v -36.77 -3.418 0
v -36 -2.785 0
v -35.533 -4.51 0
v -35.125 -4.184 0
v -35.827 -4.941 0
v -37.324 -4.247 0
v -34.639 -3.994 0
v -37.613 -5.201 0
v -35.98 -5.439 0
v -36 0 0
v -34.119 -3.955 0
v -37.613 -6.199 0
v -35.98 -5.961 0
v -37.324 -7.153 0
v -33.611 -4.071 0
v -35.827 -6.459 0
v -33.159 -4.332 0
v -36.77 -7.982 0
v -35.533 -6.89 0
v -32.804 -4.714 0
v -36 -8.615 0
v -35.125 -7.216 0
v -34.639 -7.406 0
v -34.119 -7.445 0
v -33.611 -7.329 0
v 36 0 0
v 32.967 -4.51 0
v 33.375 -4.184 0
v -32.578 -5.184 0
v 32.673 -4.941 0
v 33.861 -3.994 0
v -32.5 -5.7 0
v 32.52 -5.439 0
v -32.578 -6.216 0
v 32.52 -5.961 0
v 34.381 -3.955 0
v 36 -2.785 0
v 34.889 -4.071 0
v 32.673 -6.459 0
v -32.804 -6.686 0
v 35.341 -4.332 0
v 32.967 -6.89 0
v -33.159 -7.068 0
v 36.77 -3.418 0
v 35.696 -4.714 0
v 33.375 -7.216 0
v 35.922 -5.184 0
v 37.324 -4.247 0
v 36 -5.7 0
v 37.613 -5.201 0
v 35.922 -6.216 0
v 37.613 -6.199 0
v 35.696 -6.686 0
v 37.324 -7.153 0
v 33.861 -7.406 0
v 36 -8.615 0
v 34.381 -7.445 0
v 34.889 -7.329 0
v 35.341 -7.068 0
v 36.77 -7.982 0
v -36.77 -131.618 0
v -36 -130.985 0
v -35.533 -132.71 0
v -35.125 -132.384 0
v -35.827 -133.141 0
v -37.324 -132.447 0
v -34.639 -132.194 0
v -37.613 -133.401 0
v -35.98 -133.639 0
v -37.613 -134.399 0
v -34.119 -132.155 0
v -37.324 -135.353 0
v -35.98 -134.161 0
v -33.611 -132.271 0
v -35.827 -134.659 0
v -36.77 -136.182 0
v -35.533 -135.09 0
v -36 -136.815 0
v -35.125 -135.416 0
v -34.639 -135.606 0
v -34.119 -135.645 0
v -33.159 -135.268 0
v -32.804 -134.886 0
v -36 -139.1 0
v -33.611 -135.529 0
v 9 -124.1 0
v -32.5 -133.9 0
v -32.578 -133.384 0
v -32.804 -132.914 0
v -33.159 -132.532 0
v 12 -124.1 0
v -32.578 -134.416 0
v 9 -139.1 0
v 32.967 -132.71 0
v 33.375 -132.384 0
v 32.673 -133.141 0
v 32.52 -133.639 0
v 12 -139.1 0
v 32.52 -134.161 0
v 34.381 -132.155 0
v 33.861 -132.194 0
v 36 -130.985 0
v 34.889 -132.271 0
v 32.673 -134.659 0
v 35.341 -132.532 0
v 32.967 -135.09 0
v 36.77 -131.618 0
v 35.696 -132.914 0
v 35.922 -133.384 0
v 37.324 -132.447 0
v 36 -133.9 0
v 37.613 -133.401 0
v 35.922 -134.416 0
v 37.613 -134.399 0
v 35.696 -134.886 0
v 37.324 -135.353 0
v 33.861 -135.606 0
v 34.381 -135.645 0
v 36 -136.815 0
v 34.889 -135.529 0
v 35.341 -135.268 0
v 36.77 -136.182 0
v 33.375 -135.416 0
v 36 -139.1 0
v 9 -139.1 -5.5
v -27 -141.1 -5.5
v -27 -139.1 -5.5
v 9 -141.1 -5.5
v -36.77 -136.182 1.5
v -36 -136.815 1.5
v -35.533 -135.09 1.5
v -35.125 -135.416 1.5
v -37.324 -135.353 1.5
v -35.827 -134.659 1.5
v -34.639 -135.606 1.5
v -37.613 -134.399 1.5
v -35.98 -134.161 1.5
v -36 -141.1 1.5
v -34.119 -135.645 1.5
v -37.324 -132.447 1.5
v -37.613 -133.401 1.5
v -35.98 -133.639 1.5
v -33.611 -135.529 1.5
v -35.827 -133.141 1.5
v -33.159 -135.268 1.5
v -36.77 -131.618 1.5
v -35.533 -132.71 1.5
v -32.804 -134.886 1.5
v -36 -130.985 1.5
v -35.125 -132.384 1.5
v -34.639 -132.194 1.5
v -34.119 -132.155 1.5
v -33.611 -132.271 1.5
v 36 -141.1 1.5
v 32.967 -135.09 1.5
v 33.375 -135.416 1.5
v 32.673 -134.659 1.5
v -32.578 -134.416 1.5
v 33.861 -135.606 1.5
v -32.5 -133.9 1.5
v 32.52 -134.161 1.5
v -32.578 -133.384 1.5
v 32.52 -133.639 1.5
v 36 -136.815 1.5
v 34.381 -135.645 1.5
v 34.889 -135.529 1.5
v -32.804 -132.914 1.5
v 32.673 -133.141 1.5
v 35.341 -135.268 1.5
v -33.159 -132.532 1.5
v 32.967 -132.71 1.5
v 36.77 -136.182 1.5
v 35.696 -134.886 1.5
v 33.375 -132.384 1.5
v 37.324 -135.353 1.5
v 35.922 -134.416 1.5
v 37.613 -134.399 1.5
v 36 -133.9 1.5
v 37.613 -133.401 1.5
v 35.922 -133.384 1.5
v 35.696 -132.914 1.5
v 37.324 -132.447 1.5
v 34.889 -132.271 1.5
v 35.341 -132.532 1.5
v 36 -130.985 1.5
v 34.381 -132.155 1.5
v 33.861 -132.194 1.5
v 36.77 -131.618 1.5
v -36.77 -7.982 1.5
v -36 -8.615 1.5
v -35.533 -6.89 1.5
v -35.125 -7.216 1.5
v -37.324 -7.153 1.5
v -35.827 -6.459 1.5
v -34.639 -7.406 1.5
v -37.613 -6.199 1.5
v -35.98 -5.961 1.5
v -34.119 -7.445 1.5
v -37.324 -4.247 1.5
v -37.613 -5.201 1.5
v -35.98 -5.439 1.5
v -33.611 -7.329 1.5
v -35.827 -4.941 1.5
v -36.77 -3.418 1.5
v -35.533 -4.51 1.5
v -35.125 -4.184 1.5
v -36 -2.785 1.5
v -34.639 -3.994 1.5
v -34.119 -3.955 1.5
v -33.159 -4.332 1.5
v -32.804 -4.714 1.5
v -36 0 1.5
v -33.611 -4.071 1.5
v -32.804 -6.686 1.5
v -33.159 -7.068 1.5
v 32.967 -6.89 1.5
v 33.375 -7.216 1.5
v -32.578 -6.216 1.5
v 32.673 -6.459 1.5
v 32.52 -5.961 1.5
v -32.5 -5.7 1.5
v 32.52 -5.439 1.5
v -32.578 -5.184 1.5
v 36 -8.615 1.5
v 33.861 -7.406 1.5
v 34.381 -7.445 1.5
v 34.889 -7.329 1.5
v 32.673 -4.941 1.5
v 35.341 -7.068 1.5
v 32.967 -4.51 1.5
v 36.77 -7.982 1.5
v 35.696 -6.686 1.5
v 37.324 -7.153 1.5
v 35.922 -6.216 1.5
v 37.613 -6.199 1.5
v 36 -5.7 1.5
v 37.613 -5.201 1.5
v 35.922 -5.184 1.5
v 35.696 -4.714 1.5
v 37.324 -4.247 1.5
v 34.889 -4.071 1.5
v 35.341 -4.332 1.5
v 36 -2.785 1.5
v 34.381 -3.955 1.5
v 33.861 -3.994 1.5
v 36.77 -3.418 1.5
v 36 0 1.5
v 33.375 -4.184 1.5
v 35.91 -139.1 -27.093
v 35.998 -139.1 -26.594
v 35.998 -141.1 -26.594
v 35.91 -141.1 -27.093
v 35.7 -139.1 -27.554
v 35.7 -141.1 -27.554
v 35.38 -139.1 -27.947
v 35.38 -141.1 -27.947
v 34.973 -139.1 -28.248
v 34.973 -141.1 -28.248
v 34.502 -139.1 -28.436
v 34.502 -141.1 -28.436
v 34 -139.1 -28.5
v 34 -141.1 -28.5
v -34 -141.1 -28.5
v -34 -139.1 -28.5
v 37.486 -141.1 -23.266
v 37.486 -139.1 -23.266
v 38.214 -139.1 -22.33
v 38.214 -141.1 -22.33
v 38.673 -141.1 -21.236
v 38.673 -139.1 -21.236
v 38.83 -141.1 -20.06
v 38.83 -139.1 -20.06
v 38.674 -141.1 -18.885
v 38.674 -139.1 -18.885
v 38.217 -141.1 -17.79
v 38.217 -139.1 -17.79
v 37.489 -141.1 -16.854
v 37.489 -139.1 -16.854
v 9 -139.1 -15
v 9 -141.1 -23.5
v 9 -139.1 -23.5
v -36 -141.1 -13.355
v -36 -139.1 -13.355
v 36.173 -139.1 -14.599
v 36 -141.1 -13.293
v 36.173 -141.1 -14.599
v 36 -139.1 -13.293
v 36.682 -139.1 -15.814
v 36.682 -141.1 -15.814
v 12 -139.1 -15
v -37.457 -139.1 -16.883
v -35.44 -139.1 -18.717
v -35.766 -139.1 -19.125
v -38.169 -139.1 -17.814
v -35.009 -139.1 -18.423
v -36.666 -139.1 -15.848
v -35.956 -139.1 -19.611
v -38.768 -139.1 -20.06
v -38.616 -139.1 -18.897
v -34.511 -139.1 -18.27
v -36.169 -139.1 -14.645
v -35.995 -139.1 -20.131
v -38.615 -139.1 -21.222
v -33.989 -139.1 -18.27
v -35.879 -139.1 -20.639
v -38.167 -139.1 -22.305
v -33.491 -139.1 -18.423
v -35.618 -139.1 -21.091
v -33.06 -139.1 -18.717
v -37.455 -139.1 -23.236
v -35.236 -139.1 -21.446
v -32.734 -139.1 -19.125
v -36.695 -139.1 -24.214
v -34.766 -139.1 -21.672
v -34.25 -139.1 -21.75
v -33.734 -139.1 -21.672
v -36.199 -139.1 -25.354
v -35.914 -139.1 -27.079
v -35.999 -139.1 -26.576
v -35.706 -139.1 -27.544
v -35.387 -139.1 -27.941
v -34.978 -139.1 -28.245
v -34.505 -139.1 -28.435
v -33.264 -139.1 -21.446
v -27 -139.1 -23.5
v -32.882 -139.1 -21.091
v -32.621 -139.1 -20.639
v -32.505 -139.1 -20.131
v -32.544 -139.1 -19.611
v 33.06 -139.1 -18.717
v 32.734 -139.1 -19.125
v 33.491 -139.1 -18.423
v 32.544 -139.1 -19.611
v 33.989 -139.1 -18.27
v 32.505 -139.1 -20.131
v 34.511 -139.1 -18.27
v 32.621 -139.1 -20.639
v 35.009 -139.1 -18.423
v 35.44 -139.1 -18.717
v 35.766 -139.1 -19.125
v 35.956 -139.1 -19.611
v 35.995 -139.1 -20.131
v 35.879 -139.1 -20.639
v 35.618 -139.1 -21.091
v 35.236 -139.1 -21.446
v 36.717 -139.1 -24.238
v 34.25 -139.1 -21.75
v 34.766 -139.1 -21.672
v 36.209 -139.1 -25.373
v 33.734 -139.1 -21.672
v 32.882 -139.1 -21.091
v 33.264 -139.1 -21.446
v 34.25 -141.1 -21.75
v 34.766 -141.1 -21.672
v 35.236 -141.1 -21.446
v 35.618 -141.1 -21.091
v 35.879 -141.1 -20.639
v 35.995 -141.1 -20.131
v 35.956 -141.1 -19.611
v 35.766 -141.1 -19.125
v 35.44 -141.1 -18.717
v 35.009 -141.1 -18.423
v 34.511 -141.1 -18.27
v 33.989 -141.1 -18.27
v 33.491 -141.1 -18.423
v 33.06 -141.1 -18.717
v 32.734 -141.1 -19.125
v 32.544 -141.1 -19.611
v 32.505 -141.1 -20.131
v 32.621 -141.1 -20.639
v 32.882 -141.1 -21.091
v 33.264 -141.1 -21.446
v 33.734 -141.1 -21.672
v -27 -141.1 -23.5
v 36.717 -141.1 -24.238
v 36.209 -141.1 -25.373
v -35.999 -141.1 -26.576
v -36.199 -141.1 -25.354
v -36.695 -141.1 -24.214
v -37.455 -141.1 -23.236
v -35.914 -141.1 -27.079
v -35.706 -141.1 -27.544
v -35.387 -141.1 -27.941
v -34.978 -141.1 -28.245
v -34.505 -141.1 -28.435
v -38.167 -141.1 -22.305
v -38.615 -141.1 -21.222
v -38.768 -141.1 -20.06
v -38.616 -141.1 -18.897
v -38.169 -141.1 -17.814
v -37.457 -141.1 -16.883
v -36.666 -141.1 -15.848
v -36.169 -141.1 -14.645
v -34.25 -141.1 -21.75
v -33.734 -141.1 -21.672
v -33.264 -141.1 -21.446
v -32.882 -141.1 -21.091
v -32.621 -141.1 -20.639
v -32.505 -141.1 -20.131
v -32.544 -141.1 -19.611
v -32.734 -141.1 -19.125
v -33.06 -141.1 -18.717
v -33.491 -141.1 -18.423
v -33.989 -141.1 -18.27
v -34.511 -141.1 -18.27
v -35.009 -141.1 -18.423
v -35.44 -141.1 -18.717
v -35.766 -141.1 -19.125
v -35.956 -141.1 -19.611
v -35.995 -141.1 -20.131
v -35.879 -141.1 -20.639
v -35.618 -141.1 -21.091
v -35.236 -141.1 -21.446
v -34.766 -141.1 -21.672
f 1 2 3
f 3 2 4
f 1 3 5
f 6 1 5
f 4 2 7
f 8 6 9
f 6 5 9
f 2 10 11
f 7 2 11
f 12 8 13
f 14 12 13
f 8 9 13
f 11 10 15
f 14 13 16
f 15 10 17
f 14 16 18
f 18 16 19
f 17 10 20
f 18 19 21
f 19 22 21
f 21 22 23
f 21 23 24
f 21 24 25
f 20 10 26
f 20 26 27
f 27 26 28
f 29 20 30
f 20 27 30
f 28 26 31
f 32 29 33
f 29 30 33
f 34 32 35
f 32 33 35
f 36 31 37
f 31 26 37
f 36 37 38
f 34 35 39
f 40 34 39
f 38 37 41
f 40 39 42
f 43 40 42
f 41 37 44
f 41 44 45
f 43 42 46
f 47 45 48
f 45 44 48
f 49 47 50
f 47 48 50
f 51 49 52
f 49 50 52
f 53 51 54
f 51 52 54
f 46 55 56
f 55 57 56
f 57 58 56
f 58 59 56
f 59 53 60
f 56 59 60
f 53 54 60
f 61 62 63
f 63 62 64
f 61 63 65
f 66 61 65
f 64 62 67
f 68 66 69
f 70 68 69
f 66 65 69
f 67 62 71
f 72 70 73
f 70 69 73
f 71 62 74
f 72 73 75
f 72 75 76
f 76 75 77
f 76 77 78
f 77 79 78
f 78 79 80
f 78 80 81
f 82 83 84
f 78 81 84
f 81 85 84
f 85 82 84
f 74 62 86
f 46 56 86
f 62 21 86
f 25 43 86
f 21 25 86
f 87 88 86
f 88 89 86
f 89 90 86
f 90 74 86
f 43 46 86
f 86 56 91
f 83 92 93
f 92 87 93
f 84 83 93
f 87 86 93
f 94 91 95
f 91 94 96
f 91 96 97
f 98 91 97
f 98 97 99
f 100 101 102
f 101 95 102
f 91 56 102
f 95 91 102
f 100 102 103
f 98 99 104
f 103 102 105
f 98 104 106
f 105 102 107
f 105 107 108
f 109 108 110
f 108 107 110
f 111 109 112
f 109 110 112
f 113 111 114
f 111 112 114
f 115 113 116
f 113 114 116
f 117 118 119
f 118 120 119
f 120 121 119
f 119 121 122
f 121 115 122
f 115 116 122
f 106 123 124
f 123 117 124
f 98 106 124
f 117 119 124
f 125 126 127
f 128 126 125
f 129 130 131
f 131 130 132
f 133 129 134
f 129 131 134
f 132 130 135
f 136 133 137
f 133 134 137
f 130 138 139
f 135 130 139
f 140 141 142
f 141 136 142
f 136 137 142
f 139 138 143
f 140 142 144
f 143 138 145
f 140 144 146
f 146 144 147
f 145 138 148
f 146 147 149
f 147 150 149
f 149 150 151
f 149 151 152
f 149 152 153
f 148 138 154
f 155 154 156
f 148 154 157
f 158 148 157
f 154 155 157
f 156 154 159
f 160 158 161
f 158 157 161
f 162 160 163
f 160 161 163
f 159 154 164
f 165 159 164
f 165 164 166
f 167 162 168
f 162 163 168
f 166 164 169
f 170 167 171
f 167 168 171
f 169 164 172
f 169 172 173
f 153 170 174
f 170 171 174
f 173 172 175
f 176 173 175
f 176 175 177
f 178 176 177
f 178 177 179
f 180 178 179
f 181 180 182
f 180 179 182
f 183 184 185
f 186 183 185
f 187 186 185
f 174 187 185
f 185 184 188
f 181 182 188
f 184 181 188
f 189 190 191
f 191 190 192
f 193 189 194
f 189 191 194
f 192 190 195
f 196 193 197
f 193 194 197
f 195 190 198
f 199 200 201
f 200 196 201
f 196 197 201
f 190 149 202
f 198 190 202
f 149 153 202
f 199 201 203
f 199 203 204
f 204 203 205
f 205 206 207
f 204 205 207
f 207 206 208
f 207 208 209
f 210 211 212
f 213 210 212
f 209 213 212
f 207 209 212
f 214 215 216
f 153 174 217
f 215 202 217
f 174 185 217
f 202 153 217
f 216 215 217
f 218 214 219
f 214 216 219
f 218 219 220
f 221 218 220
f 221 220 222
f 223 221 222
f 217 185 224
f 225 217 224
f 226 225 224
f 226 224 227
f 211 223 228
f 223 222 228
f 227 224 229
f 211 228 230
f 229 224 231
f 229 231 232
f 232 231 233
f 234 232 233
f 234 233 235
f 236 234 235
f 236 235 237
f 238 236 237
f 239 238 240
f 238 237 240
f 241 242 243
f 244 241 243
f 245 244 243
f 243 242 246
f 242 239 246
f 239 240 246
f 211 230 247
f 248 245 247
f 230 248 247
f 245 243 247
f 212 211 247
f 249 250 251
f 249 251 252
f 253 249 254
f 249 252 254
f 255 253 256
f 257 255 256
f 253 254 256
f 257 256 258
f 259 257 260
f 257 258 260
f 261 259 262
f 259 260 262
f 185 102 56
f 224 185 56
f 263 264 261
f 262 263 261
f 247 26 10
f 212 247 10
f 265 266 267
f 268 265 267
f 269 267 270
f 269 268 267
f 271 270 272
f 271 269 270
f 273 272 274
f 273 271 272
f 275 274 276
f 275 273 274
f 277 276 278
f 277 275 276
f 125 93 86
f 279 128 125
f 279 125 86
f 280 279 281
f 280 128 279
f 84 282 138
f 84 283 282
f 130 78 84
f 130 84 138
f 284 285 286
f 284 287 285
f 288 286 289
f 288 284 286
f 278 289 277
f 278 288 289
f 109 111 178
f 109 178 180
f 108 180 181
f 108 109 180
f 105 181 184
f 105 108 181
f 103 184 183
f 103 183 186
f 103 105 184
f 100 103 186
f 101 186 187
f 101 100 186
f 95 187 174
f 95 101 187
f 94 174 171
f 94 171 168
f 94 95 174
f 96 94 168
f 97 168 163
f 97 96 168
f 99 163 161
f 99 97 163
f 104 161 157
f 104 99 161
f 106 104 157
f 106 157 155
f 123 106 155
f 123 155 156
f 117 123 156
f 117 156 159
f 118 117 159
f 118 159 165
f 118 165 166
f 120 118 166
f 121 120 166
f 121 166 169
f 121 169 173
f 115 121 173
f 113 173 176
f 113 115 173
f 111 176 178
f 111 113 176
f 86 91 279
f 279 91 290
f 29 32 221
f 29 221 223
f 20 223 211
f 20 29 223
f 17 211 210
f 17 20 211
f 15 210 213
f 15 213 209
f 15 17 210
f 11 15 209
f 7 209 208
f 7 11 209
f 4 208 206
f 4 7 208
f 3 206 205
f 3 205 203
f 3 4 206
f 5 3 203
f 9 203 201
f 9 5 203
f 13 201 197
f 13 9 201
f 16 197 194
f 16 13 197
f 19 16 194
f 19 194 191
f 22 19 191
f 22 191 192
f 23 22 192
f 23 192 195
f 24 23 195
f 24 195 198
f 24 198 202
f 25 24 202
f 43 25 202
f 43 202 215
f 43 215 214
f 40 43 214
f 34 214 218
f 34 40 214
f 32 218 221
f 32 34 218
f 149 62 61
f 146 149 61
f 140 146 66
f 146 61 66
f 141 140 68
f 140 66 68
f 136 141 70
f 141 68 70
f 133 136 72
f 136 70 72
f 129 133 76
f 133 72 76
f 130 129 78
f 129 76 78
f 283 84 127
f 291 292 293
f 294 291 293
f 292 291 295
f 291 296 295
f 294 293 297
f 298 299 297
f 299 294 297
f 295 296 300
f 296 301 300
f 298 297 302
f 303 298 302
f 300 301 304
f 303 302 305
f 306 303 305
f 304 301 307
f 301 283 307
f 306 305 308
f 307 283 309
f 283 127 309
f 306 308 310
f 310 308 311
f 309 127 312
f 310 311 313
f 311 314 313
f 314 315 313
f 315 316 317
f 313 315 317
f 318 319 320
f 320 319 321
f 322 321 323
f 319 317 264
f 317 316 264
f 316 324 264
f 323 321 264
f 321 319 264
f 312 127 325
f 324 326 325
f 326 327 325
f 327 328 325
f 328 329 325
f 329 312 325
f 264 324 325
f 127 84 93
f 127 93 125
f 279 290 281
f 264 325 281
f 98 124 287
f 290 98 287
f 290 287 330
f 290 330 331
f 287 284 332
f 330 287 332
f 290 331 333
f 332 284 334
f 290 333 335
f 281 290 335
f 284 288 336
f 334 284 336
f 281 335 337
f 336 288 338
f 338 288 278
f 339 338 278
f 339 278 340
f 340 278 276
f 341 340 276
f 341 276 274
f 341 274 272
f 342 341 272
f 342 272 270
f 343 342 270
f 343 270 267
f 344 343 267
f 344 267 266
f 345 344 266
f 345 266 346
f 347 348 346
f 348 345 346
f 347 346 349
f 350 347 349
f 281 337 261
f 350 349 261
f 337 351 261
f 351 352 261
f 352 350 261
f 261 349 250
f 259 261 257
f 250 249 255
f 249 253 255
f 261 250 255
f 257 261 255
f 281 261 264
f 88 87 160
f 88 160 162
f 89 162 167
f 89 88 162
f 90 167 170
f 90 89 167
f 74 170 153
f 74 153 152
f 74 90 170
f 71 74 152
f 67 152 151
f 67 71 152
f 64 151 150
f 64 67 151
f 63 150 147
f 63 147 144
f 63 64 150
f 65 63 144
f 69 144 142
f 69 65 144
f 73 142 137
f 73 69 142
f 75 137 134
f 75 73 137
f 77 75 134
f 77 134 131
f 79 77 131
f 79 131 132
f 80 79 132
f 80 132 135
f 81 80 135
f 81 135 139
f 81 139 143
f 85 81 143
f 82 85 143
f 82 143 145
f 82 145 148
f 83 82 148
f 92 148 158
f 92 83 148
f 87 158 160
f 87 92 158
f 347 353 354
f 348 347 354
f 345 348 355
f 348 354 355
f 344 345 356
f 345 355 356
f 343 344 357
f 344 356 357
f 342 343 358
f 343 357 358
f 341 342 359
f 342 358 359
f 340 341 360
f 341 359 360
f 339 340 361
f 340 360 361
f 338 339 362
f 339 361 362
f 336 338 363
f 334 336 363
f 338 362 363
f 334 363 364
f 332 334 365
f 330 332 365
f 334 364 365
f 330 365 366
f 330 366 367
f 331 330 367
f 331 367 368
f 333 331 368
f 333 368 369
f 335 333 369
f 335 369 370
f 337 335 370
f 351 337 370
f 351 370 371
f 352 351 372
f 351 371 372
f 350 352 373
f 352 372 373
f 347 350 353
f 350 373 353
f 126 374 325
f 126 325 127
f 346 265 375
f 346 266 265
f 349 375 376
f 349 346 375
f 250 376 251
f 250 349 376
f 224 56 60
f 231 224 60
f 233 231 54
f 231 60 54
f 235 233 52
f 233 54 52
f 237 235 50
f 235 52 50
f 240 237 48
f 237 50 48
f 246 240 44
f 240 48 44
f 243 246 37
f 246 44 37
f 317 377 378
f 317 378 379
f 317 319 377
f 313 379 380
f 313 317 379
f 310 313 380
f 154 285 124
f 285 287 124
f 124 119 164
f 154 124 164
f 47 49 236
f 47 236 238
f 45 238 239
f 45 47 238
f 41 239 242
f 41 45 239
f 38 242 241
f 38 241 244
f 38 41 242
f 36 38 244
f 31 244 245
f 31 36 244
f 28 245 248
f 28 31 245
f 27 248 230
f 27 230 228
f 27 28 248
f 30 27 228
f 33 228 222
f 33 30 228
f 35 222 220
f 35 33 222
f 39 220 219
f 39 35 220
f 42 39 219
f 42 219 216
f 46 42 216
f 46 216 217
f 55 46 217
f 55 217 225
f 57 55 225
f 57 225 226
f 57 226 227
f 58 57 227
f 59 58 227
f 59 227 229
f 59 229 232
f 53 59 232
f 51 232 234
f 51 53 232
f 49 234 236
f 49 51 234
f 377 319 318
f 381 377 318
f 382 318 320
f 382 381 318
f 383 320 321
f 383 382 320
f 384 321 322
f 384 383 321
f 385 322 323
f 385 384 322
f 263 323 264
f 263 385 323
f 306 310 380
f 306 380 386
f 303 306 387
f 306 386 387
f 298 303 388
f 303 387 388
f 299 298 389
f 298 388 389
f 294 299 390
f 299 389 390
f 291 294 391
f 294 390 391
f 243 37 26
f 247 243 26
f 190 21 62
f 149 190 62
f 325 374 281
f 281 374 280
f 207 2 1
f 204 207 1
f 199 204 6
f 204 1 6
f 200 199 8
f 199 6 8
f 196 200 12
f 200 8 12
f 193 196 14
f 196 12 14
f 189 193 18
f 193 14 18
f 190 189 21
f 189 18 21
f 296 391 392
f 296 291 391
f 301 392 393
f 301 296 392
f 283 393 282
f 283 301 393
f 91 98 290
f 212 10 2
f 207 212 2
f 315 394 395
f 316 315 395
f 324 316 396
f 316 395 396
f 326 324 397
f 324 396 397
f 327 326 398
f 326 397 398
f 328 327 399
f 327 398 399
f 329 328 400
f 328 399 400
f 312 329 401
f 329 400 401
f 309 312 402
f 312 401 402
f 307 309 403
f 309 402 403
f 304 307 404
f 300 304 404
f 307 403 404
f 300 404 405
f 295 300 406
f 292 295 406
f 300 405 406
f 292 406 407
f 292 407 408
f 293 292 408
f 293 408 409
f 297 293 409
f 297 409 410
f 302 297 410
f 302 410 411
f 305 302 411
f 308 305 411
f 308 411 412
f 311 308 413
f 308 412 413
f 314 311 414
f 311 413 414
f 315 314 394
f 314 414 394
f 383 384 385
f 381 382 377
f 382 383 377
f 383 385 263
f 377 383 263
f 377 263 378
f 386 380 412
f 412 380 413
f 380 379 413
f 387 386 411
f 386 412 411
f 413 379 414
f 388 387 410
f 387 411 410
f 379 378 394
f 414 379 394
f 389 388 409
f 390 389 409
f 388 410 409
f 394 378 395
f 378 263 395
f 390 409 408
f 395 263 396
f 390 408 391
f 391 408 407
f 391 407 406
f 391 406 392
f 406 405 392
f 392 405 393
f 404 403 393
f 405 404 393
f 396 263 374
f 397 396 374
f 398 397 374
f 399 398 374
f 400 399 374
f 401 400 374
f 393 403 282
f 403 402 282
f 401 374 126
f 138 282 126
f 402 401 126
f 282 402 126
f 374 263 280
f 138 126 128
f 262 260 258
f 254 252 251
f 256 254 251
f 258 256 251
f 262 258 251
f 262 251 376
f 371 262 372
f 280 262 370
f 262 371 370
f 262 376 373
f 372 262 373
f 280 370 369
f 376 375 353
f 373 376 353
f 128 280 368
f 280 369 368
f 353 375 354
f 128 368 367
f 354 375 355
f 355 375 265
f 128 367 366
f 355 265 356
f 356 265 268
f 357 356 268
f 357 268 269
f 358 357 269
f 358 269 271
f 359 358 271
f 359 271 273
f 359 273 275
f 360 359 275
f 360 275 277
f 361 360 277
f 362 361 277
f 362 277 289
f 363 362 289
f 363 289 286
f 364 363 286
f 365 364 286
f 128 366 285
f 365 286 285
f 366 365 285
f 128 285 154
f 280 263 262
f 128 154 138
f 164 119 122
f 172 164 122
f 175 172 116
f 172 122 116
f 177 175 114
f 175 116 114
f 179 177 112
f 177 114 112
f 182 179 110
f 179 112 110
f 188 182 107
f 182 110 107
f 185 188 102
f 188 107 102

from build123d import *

# Parameters (mm, degrees)
SKETCH1_R               = 1.75
BOSS_EXTRUDE1_DEPTH     = 1.5
BOSS_EXTRUDE2_START     = -72
BOSS_EXTRUDE2_DEPTH     = 72
BOSS_EXTRUDE4_DEPTH     = 2
SKETCH5_R               = 1.75
CUT_EXTRUDE1_DEPTH      = 2
CUT_EXTRUDE2_DEPTH      = 152.713437324
CUT_EXTRUDE2_DEPTH_BACK = 152.713437324
SKETCH6_W               = 72
SKETCH6_H               = 11.5
FILLET1_R               = 2
SKETCH8_W               = 36
SKETCH8_H               = 18
CUT_EXTRUDE3_DEPTH      = 22.4262221
SKETCH11_W              = 3
SKETCH11_H              = 15
BOSS_EXTRUDE7_DEPTH     = 15
CUT_EXTRUDE5_REACH      = 154.64
FILLET3_R               = 5


with BuildPart() as part:
    # Sketch1 → Boss-Extrude1 (new body)
    with BuildSketch(Plane.XY):
        with BuildLine():
            Line((-32.5, -138.9), (32.5, -138.9))
            Line((32.5, -138.9), (36, -138.9))
            Line((36, -138.9), (36, -136.815047169))
            ThreePointArc((36, -136.815047169), (37.65, -133.9), (36, -130.984952831))
            Line((36, -130.984952831), (36, -8.615047169))
            ThreePointArc((36, -8.615047169), (37.65, -5.7), (36, -2.784952831))
            Line((36, -2.784952831), (36, 0))
            Line((36, 0), (-36, 0))
            Line((-36, 0), (-36, -2.784952831))
            ThreePointArc((-36, -2.784952831), (-37.65, -5.7), (-36, -8.615047169))
            Line((-36, -8.615047169), (-36, -130.984952831))
            ThreePointArc((-36, -130.984952831), (-37.65, -133.9), (-36, -136.815047169))
            Line((-36, -136.815047169), (-36, -138.9))
            Line((-36, -138.9), (-32.5, -138.9))
        make_face()
        with Locations((-34.25, -133.9)):
            Circle(SKETCH1_R, mode=Mode.SUBTRACT)
        with Locations((34.25, -133.9)):
            Circle(SKETCH1_R, mode=Mode.SUBTRACT)
        with Locations((34.25, -5.7)):
            Circle(SKETCH1_R, mode=Mode.SUBTRACT)
        with Locations((-34.25, -5.7)):
            Circle(SKETCH1_R, mode=Mode.SUBTRACT)
    extrude(amount=BOSS_EXTRUDE1_DEPTH)

    # Sketch2 → Boss-Extrude2 (add)
    with BuildSketch(Plane.ZY.offset(36).offset(BOSS_EXTRUDE2_START)):
        Polygon((1.5, -141.1), (1.5, -138.9), (0, -138.9), (0, -139.1), (-40, -139.1), (-40, -141.1), align=None)
    extrude(amount=BOSS_EXTRUDE2_DEPTH)

    # Sketch4 → Boss-Extrude4 (add)
    with BuildSketch(Plane.XZ.offset(141.1)):
        with BuildLine():
            Line((-36, -15.904411924), (-36, -24.211404996))
            ThreePointArc((-36, -24.211404996), (-38.768391924, -20.05790846), (-36, -15.904411924))
        make_face()
        with BuildLine():
            Line((36, -15.879321263), (36, -24.236495657))
            ThreePointArc((36, -24.236495657), (38.8298476, -20.05790846), (36, -15.879321263))
        make_face()
    extrude(amount=-BOSS_EXTRUDE4_DEPTH)

    # Sketch5 → Cut-Extrude1 (cut)
    with BuildSketch(Plane.XZ.offset(141.1)):
        with Locations(Location((-34.25, -20, 0), (0, 0, 270))):
            Circle(SKETCH5_R)
        with Locations(Location((34.25, -20, 0), (0, 0, 270))):
            Circle(SKETCH5_R)
    extrude(amount=-CUT_EXTRUDE1_DEPTH, mode=Mode.SUBTRACT)

    # Sketch6 → Cut-Extrude2 (cut, two sides: drawn at the far end of the back side and taken through both)
    with BuildSketch(Plane.XZ.offset(141.1).offset(-CUT_EXTRUDE2_DEPTH_BACK)):
        with Locations((0, -34.25)):
            Rectangle(SKETCH6_W, SKETCH6_H)
    extrude(amount=CUT_EXTRUDE2_DEPTH + CUT_EXTRUDE2_DEPTH_BACK, mode=Mode.SUBTRACT)

    # Fillet1
    fillet1_edges = [part.edges().sort_by_distance(p)[0] for p in [
        (36, -140.1, -28.5),
        (-36, -140.1, -28.5),
    ]]
    fillet(fillet1_edges, radius=FILLET1_R)

    # Sketch8 → Cut-Extrude3 (cut)
    with BuildSketch(Plane.XZ.offset(141.1)):
        with Locations((-9, -14.5)):
            Rectangle(SKETCH8_W, SKETCH8_H)
    extrude(amount=-CUT_EXTRUDE3_DEPTH, mode=Mode.SUBTRACT)

    # Sketch11 → Boss-Extrude7 (add)
    with BuildSketch(Plane(origin=(0, -139.1, 0), x_dir=(1, 0, 0), z_dir=(0, 1, 0))):
        with Locations((10.5, 7.5)):
            Rectangle(SKETCH11_W, SKETCH11_H)
    extrude(amount=BOSS_EXTRUDE7_DEPTH)

    # Sketch12 → Cut-Extrude5 (cut, up to next)
    with BuildSketch(Plane(origin=(12, 0, 0), x_dir=(0, 0, -1), z_dir=(1, 0, 0)), mode=Mode.PRIVATE) as cut_extrude5_sk1:
        Polygon((0, -124.1), (15, -139.1), (15, -124.1), align=None)
    cut_extrude5_tool1 = extrude(cut_extrude5_sk1.sketch, amount=-CUT_EXTRUDE5_REACH, mode=Mode.PRIVATE) & part.part
    add(cut_extrude5_tool1.solids().sort_by_distance((12, -129.1, -10))[0], mode=Mode.SUBTRACT)

    # Fillet3
    fillet3_edges = [part.edges().sort_by_distance(p)[0] for p in [
        (36, -140.1, -24.236495657),
        (36, -140.1, -15.879321263),
        (-36, -140.1, -15.904411924),
        (-36, -140.1, -24.211404996),
    ]]
    fillet(fillet3_edges, radius=FILLET3_R)


solid = part.part
